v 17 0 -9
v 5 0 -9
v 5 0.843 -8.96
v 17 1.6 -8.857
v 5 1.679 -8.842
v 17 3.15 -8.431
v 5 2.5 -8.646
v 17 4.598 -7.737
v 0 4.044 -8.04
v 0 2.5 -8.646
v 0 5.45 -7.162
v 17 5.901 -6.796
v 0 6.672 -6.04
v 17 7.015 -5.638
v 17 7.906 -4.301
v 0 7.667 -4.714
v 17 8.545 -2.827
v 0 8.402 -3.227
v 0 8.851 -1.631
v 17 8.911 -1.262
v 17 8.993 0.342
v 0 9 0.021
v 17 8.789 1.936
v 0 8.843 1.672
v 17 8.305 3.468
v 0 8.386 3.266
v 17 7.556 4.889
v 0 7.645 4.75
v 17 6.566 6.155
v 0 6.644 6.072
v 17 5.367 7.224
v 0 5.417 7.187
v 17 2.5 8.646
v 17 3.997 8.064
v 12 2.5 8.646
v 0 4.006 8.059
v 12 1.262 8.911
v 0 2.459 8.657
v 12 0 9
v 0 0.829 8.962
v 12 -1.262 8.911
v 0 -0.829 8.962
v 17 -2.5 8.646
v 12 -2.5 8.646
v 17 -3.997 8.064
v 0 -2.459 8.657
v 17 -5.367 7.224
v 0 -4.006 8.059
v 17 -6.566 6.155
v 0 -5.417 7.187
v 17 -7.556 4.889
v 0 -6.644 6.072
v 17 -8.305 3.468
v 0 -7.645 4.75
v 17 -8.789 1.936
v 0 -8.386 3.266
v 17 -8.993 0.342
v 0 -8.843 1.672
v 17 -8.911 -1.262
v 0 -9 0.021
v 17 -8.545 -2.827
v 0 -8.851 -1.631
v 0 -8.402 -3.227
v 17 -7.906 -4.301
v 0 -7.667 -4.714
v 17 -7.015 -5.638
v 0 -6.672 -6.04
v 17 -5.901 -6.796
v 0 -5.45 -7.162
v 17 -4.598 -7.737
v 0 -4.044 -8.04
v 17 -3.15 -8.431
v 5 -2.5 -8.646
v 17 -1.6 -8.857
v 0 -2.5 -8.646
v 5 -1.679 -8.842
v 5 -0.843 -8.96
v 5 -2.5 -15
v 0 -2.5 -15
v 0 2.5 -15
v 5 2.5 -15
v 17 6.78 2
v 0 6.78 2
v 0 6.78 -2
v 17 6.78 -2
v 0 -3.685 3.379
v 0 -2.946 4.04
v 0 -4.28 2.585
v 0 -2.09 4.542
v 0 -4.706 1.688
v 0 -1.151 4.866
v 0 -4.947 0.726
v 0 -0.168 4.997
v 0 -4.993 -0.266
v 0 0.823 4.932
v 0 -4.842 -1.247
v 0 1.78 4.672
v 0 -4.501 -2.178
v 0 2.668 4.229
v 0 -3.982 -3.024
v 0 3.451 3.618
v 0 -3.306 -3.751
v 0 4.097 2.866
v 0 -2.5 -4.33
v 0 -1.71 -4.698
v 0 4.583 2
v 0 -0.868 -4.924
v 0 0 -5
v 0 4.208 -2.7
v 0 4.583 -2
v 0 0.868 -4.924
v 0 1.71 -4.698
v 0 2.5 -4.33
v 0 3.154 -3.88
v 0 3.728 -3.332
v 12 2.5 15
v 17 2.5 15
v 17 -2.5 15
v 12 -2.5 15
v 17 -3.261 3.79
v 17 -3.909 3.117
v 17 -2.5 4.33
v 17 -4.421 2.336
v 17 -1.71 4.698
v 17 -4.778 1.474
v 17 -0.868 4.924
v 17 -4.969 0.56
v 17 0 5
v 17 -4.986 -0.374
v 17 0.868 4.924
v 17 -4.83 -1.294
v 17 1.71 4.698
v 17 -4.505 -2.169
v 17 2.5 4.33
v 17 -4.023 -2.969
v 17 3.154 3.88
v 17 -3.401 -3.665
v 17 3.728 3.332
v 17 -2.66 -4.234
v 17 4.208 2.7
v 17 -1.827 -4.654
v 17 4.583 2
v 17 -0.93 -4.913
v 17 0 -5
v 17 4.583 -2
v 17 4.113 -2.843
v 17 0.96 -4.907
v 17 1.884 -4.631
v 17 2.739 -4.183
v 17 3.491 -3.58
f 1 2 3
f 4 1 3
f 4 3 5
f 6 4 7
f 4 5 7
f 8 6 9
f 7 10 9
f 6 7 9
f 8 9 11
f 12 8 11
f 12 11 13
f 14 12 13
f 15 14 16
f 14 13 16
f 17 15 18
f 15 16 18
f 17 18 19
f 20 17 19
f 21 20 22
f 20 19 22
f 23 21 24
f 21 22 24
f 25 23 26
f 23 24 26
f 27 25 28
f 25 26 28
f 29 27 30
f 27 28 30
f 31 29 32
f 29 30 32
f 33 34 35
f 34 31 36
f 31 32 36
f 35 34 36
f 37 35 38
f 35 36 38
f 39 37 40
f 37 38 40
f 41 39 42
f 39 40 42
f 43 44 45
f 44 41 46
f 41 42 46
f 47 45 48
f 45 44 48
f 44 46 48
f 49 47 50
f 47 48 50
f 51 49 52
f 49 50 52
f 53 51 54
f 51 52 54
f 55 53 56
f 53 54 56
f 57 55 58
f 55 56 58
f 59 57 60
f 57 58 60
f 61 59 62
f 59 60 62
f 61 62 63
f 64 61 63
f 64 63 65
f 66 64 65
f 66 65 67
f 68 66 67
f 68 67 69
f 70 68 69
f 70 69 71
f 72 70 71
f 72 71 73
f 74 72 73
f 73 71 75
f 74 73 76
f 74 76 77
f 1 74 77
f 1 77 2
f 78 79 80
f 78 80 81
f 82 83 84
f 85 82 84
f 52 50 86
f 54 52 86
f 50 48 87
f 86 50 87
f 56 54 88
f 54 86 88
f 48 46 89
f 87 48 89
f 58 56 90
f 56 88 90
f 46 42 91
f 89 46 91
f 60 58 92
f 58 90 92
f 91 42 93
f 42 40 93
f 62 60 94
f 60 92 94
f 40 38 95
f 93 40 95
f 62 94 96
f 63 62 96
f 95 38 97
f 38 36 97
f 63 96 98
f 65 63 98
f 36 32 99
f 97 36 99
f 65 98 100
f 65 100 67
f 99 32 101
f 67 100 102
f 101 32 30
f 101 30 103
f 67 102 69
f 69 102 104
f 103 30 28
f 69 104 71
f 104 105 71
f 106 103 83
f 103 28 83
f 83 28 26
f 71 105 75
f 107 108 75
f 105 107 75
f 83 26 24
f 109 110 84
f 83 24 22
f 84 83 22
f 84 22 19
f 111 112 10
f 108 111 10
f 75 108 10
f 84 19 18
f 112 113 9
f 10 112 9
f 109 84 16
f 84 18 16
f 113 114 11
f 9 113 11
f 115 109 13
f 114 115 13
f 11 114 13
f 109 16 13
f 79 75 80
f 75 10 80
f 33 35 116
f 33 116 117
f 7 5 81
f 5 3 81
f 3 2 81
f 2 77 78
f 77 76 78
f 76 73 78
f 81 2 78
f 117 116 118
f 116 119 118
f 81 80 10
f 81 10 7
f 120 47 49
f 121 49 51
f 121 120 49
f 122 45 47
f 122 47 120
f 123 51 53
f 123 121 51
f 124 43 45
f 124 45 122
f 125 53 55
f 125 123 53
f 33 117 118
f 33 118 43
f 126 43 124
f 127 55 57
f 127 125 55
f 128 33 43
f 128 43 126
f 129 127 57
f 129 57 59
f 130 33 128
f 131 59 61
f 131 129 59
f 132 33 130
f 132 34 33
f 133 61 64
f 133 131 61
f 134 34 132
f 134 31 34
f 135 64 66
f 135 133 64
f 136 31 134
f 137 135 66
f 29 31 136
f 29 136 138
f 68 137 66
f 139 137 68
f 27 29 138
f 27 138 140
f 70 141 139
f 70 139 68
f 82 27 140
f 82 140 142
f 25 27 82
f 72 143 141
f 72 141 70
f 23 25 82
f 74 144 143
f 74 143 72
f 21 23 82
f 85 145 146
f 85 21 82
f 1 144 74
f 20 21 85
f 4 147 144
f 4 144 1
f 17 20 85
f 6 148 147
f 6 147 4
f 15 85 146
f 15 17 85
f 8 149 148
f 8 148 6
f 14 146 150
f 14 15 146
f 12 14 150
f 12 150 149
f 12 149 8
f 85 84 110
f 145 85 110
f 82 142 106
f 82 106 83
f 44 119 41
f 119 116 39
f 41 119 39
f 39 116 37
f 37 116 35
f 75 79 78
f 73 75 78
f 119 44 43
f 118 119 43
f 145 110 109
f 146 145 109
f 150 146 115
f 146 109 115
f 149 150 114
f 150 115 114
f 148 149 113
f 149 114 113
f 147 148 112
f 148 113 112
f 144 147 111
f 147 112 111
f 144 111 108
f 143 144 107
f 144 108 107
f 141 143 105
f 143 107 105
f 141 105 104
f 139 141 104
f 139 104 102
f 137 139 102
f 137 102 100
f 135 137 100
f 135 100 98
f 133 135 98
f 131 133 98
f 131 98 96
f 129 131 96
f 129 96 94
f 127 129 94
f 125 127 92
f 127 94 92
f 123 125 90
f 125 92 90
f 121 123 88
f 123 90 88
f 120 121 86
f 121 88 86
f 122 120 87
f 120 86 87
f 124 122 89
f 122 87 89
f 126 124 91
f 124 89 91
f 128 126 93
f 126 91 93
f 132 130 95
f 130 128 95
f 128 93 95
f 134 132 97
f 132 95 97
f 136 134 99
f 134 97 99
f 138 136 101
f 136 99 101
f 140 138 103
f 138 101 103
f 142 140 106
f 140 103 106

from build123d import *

# Parameters (mm, degrees)
SKETCH1_R           = 9
BOSS_EXTRUDE1_DEPTH = 17
SKETCH3_W           = 5
SKETCH3_H           = 15
BOSS_EXTRUDE3_DEPTH = 2.5
SKETCH4_R           = 5
CUT_EXTRUDE1_DEPTH  = 25.392621835


with BuildPart() as part:
    # Sketch1 → Boss-Extrude1 (new body)
    with BuildSketch(Plane(origin=(0, 0, 0), x_dir=(0, 0, -1), z_dir=(1, 0, 0))):
        Circle(SKETCH1_R)
        with BuildLine():
            ThreePointArc((5, 0), (-2.738612788, -4.183300133), (-2, 4.582575695))
            Line((-2, 4.582575695), (-2, 6.78))
            Line((-2, 6.78), (2, 6.78))
            Line((2, 6.78), (2, 4.582575695))
            ThreePointArc((2, 4.582575695), (4.183300133, 2.738612788), (5, 0))
        make_face(mode=Mode.SUBTRACT)
    extrude(amount=BOSS_EXTRUDE1_DEPTH)

    # Sketch3 → Boss-Extrude3 (add)
    with BuildSketch(Plane(origin=(0, 0, 0), x_dir=(1, 0, 0), z_dir=(0, 1, 0))):
        with Locations((2.5, 7.5)):
            Rectangle(SKETCH3_W, SKETCH3_H)
        with Locations((14.5, -7.5)):
            Rectangle(SKETCH3_W, SKETCH3_H)
    boss_extrude3 = extrude(amount=BOSS_EXTRUDE3_DEPTH)

    # Mirror1: Boss-Extrude3 across plane
    add(boss_extrude3.mirror(Plane(origin=(0, 0, 0), x_dir=(0, 0, 1), z_dir=(0, -1, 0))))

    # Sketch4 → Cut-Extrude1 (cut, through all)
    with BuildSketch(Plane.ZY):
        Circle(SKETCH4_R)
    extrude(amount=-CUT_EXTRUDE1_DEPTH, mode=Mode.SUBTRACT)


solid = part.part
